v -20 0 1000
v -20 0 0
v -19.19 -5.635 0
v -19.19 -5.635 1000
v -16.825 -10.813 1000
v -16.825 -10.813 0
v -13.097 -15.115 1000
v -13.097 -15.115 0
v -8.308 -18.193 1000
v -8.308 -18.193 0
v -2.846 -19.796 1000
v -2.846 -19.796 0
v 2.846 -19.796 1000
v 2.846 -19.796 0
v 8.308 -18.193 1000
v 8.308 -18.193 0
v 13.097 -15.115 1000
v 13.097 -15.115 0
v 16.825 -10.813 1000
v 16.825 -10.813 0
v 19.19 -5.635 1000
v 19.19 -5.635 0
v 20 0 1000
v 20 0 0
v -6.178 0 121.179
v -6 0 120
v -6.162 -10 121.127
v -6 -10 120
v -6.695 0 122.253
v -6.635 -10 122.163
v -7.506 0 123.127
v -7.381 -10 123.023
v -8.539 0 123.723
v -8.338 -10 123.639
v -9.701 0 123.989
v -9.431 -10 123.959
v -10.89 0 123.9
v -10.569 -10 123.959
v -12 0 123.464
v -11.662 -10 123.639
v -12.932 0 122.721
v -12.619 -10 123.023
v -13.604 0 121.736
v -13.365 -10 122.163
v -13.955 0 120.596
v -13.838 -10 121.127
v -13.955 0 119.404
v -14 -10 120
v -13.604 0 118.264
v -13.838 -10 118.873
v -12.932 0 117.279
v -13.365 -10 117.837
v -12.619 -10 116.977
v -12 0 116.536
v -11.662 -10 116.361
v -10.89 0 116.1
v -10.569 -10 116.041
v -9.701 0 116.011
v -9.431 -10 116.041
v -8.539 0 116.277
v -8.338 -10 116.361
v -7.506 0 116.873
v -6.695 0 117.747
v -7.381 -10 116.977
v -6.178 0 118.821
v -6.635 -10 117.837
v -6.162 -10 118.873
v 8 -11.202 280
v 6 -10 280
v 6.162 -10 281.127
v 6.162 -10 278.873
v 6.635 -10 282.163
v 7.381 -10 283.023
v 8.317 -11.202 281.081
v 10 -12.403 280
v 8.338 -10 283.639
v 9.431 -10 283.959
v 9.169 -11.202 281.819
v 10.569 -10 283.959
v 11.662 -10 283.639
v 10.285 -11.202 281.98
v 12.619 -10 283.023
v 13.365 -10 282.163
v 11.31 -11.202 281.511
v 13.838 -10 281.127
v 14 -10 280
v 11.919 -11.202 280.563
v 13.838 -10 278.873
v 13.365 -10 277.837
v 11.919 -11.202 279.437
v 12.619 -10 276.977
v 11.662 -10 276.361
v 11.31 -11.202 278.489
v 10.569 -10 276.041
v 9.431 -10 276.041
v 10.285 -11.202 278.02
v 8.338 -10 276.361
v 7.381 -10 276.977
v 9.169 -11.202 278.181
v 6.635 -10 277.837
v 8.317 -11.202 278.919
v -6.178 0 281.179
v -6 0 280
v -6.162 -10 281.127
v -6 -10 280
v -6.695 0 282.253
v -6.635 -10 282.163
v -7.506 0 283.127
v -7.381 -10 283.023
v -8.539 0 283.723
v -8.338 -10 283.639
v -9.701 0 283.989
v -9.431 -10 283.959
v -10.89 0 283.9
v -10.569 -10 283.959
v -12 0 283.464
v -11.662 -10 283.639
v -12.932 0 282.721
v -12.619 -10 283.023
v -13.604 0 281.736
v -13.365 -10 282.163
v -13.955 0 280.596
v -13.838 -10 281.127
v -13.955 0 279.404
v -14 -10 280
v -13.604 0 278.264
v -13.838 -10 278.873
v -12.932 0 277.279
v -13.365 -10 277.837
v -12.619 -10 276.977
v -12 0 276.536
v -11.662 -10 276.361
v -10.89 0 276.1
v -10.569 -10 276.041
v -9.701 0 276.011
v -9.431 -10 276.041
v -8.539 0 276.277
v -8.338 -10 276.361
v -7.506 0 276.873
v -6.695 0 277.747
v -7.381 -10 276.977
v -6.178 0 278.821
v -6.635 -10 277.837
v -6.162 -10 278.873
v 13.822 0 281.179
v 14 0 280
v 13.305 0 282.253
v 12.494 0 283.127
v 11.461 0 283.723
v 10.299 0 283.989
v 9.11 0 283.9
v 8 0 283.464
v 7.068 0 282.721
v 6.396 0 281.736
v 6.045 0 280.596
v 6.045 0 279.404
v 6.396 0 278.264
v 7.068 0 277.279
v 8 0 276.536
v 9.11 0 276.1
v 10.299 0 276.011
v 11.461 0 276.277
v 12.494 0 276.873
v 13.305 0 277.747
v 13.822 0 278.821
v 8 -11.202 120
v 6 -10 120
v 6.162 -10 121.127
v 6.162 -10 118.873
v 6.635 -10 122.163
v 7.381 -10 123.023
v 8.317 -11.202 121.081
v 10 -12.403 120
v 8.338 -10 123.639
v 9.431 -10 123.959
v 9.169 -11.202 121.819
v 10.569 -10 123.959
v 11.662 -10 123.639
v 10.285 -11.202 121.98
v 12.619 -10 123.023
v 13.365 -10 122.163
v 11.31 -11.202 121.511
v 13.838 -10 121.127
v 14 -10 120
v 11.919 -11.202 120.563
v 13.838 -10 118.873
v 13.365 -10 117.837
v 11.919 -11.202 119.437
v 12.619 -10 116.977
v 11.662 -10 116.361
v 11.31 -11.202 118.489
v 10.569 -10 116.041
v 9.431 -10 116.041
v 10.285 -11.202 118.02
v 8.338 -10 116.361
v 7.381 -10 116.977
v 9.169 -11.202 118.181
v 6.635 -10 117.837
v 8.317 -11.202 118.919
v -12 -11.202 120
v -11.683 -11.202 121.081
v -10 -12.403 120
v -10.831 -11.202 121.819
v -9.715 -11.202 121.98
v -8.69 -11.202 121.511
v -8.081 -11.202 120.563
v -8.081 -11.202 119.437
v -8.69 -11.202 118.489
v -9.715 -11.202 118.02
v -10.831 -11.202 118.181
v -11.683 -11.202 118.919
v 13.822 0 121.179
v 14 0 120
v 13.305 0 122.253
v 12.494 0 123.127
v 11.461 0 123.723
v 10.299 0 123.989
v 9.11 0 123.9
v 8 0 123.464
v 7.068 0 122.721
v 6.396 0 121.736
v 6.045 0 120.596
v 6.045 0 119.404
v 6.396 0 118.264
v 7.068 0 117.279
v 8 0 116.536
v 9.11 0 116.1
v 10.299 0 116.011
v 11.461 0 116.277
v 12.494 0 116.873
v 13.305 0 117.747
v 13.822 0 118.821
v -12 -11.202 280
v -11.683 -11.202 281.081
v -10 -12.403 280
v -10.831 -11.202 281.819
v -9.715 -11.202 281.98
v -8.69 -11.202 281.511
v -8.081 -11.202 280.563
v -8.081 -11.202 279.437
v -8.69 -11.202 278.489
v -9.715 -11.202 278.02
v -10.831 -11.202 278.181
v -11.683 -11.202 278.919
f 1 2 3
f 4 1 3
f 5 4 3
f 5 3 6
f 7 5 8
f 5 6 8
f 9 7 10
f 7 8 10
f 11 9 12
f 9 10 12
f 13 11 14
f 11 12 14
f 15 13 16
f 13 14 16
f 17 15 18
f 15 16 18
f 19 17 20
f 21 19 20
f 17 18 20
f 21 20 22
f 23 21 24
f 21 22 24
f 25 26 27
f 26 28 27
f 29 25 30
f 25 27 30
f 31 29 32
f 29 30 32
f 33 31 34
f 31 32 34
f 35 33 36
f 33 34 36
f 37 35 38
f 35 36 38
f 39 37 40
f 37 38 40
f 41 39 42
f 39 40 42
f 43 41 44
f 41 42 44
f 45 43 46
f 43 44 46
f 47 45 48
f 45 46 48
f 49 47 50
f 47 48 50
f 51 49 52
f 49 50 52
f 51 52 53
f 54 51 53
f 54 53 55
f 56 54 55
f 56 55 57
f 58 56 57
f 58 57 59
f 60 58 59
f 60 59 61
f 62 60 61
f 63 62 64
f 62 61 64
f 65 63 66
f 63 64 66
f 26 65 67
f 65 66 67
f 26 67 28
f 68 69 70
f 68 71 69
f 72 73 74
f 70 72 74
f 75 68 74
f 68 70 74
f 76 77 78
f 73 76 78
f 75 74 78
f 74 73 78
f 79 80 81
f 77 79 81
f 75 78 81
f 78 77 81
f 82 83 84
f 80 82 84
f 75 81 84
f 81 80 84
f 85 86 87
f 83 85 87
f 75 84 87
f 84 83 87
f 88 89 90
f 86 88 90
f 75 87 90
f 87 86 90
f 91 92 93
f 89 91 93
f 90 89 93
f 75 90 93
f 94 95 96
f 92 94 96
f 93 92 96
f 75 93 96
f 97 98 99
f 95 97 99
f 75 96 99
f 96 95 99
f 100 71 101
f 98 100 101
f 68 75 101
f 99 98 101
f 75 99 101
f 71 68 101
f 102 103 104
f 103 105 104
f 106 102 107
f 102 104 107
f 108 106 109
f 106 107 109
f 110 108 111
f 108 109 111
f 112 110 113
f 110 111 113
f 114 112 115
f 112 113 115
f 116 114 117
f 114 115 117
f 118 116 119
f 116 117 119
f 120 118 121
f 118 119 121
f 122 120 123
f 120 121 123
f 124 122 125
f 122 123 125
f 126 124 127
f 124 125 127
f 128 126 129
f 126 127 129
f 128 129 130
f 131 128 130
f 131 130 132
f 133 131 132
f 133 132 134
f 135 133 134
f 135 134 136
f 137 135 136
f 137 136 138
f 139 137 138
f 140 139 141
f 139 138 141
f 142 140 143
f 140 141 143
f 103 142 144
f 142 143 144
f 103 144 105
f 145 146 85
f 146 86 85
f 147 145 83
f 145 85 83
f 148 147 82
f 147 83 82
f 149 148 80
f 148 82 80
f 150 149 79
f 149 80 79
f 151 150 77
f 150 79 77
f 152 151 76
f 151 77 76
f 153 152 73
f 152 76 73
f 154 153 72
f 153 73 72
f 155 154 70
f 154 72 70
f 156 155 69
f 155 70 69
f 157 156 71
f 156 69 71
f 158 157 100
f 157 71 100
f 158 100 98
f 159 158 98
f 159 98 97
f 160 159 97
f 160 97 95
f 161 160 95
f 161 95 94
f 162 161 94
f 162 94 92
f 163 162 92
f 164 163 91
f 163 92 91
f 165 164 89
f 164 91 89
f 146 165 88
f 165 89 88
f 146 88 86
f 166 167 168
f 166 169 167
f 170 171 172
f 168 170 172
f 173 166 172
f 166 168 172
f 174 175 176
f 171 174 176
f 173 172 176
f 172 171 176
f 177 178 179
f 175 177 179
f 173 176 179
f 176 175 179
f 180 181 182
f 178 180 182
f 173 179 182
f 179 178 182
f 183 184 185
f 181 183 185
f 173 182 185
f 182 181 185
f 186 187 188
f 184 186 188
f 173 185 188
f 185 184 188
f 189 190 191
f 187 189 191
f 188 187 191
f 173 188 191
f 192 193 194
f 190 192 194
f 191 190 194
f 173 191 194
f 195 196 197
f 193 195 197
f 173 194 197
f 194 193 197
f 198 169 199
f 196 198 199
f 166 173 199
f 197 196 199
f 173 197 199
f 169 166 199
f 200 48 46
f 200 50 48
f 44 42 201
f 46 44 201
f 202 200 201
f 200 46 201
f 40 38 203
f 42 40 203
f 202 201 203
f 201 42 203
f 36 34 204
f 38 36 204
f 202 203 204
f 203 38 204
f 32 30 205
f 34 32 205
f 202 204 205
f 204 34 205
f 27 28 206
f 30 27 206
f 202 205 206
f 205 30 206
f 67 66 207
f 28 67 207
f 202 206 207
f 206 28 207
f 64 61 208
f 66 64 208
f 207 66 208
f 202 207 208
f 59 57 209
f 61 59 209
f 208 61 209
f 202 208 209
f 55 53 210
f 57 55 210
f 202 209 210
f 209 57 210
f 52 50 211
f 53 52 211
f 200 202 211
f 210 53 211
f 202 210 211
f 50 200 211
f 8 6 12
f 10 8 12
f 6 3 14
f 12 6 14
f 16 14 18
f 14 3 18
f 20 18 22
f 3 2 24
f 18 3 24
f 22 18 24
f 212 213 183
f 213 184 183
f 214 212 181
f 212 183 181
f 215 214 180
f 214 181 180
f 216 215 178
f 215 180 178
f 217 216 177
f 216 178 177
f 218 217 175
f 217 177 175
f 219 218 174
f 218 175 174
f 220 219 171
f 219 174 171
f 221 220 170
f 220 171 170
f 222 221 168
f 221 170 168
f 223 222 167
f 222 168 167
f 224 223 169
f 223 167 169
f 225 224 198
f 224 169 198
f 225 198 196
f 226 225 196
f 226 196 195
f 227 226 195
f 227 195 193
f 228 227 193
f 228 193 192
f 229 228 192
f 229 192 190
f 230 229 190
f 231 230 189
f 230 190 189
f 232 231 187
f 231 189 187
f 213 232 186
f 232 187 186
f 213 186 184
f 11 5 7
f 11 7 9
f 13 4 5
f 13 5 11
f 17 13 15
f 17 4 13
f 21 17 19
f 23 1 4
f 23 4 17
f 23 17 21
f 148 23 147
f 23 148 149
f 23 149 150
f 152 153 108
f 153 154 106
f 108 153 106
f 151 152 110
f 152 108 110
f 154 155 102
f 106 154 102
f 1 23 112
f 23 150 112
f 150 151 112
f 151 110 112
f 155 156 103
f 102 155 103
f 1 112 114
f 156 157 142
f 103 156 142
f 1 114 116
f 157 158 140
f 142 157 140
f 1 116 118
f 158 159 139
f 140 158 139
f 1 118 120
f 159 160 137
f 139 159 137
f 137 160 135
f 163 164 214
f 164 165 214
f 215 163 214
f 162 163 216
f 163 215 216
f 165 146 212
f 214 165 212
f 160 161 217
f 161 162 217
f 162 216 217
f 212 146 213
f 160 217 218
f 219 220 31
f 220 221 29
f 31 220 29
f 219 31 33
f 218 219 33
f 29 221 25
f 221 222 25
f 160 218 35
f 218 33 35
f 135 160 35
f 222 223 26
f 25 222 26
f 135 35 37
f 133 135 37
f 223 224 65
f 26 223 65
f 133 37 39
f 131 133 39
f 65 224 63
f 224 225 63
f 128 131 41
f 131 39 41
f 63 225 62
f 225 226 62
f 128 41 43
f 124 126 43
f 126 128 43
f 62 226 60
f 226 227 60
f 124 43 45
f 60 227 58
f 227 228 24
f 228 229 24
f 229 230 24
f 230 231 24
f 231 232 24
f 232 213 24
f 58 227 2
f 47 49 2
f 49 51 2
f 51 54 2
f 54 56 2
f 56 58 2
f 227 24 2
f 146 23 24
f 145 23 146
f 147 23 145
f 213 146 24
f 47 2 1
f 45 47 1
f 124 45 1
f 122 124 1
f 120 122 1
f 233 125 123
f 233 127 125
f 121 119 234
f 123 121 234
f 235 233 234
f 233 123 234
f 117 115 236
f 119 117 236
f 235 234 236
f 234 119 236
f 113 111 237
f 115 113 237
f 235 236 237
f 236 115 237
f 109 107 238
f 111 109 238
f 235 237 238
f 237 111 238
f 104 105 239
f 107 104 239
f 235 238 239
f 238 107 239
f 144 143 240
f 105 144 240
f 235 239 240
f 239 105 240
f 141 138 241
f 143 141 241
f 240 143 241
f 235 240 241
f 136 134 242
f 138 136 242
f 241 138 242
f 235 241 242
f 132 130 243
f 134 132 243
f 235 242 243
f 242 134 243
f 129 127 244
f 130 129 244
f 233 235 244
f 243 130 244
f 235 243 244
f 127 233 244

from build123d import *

# Parameters (mm, degrees)
F1_DEPTH = 1000
F3_D     = 8
F3_DEPTH = 10
F3_TIP   = 2.4034424761


with BuildPart() as f1:
    # F0 (on Top) → F1 (new body)
    with BuildSketch(Plane.XY):
        with BuildLine():
            Line((20, 0), (-20, 0))
            ThreePointArc((-20, 0), (0, -20), (20, 0))
        make_face()
    extrude(amount=F1_DEPTH)

    # F3
    with Locations(Plane(origin=(0, 0, 0), x_dir=(-1, 0, 0), z_dir=(0, 1, 0))):
        with Locations((-10, 280), (10, 280), (-10, 120), (10, 120)):
            Hole(F3_D / 2, depth=F3_DEPTH)
            with Locations((0, 0, -(F3_DEPTH + F3_TIP / 2))):  # 118° drill point
                Cone(0, F3_D / 2, F3_TIP, mode=Mode.SUBTRACT)


solid = f1.part
